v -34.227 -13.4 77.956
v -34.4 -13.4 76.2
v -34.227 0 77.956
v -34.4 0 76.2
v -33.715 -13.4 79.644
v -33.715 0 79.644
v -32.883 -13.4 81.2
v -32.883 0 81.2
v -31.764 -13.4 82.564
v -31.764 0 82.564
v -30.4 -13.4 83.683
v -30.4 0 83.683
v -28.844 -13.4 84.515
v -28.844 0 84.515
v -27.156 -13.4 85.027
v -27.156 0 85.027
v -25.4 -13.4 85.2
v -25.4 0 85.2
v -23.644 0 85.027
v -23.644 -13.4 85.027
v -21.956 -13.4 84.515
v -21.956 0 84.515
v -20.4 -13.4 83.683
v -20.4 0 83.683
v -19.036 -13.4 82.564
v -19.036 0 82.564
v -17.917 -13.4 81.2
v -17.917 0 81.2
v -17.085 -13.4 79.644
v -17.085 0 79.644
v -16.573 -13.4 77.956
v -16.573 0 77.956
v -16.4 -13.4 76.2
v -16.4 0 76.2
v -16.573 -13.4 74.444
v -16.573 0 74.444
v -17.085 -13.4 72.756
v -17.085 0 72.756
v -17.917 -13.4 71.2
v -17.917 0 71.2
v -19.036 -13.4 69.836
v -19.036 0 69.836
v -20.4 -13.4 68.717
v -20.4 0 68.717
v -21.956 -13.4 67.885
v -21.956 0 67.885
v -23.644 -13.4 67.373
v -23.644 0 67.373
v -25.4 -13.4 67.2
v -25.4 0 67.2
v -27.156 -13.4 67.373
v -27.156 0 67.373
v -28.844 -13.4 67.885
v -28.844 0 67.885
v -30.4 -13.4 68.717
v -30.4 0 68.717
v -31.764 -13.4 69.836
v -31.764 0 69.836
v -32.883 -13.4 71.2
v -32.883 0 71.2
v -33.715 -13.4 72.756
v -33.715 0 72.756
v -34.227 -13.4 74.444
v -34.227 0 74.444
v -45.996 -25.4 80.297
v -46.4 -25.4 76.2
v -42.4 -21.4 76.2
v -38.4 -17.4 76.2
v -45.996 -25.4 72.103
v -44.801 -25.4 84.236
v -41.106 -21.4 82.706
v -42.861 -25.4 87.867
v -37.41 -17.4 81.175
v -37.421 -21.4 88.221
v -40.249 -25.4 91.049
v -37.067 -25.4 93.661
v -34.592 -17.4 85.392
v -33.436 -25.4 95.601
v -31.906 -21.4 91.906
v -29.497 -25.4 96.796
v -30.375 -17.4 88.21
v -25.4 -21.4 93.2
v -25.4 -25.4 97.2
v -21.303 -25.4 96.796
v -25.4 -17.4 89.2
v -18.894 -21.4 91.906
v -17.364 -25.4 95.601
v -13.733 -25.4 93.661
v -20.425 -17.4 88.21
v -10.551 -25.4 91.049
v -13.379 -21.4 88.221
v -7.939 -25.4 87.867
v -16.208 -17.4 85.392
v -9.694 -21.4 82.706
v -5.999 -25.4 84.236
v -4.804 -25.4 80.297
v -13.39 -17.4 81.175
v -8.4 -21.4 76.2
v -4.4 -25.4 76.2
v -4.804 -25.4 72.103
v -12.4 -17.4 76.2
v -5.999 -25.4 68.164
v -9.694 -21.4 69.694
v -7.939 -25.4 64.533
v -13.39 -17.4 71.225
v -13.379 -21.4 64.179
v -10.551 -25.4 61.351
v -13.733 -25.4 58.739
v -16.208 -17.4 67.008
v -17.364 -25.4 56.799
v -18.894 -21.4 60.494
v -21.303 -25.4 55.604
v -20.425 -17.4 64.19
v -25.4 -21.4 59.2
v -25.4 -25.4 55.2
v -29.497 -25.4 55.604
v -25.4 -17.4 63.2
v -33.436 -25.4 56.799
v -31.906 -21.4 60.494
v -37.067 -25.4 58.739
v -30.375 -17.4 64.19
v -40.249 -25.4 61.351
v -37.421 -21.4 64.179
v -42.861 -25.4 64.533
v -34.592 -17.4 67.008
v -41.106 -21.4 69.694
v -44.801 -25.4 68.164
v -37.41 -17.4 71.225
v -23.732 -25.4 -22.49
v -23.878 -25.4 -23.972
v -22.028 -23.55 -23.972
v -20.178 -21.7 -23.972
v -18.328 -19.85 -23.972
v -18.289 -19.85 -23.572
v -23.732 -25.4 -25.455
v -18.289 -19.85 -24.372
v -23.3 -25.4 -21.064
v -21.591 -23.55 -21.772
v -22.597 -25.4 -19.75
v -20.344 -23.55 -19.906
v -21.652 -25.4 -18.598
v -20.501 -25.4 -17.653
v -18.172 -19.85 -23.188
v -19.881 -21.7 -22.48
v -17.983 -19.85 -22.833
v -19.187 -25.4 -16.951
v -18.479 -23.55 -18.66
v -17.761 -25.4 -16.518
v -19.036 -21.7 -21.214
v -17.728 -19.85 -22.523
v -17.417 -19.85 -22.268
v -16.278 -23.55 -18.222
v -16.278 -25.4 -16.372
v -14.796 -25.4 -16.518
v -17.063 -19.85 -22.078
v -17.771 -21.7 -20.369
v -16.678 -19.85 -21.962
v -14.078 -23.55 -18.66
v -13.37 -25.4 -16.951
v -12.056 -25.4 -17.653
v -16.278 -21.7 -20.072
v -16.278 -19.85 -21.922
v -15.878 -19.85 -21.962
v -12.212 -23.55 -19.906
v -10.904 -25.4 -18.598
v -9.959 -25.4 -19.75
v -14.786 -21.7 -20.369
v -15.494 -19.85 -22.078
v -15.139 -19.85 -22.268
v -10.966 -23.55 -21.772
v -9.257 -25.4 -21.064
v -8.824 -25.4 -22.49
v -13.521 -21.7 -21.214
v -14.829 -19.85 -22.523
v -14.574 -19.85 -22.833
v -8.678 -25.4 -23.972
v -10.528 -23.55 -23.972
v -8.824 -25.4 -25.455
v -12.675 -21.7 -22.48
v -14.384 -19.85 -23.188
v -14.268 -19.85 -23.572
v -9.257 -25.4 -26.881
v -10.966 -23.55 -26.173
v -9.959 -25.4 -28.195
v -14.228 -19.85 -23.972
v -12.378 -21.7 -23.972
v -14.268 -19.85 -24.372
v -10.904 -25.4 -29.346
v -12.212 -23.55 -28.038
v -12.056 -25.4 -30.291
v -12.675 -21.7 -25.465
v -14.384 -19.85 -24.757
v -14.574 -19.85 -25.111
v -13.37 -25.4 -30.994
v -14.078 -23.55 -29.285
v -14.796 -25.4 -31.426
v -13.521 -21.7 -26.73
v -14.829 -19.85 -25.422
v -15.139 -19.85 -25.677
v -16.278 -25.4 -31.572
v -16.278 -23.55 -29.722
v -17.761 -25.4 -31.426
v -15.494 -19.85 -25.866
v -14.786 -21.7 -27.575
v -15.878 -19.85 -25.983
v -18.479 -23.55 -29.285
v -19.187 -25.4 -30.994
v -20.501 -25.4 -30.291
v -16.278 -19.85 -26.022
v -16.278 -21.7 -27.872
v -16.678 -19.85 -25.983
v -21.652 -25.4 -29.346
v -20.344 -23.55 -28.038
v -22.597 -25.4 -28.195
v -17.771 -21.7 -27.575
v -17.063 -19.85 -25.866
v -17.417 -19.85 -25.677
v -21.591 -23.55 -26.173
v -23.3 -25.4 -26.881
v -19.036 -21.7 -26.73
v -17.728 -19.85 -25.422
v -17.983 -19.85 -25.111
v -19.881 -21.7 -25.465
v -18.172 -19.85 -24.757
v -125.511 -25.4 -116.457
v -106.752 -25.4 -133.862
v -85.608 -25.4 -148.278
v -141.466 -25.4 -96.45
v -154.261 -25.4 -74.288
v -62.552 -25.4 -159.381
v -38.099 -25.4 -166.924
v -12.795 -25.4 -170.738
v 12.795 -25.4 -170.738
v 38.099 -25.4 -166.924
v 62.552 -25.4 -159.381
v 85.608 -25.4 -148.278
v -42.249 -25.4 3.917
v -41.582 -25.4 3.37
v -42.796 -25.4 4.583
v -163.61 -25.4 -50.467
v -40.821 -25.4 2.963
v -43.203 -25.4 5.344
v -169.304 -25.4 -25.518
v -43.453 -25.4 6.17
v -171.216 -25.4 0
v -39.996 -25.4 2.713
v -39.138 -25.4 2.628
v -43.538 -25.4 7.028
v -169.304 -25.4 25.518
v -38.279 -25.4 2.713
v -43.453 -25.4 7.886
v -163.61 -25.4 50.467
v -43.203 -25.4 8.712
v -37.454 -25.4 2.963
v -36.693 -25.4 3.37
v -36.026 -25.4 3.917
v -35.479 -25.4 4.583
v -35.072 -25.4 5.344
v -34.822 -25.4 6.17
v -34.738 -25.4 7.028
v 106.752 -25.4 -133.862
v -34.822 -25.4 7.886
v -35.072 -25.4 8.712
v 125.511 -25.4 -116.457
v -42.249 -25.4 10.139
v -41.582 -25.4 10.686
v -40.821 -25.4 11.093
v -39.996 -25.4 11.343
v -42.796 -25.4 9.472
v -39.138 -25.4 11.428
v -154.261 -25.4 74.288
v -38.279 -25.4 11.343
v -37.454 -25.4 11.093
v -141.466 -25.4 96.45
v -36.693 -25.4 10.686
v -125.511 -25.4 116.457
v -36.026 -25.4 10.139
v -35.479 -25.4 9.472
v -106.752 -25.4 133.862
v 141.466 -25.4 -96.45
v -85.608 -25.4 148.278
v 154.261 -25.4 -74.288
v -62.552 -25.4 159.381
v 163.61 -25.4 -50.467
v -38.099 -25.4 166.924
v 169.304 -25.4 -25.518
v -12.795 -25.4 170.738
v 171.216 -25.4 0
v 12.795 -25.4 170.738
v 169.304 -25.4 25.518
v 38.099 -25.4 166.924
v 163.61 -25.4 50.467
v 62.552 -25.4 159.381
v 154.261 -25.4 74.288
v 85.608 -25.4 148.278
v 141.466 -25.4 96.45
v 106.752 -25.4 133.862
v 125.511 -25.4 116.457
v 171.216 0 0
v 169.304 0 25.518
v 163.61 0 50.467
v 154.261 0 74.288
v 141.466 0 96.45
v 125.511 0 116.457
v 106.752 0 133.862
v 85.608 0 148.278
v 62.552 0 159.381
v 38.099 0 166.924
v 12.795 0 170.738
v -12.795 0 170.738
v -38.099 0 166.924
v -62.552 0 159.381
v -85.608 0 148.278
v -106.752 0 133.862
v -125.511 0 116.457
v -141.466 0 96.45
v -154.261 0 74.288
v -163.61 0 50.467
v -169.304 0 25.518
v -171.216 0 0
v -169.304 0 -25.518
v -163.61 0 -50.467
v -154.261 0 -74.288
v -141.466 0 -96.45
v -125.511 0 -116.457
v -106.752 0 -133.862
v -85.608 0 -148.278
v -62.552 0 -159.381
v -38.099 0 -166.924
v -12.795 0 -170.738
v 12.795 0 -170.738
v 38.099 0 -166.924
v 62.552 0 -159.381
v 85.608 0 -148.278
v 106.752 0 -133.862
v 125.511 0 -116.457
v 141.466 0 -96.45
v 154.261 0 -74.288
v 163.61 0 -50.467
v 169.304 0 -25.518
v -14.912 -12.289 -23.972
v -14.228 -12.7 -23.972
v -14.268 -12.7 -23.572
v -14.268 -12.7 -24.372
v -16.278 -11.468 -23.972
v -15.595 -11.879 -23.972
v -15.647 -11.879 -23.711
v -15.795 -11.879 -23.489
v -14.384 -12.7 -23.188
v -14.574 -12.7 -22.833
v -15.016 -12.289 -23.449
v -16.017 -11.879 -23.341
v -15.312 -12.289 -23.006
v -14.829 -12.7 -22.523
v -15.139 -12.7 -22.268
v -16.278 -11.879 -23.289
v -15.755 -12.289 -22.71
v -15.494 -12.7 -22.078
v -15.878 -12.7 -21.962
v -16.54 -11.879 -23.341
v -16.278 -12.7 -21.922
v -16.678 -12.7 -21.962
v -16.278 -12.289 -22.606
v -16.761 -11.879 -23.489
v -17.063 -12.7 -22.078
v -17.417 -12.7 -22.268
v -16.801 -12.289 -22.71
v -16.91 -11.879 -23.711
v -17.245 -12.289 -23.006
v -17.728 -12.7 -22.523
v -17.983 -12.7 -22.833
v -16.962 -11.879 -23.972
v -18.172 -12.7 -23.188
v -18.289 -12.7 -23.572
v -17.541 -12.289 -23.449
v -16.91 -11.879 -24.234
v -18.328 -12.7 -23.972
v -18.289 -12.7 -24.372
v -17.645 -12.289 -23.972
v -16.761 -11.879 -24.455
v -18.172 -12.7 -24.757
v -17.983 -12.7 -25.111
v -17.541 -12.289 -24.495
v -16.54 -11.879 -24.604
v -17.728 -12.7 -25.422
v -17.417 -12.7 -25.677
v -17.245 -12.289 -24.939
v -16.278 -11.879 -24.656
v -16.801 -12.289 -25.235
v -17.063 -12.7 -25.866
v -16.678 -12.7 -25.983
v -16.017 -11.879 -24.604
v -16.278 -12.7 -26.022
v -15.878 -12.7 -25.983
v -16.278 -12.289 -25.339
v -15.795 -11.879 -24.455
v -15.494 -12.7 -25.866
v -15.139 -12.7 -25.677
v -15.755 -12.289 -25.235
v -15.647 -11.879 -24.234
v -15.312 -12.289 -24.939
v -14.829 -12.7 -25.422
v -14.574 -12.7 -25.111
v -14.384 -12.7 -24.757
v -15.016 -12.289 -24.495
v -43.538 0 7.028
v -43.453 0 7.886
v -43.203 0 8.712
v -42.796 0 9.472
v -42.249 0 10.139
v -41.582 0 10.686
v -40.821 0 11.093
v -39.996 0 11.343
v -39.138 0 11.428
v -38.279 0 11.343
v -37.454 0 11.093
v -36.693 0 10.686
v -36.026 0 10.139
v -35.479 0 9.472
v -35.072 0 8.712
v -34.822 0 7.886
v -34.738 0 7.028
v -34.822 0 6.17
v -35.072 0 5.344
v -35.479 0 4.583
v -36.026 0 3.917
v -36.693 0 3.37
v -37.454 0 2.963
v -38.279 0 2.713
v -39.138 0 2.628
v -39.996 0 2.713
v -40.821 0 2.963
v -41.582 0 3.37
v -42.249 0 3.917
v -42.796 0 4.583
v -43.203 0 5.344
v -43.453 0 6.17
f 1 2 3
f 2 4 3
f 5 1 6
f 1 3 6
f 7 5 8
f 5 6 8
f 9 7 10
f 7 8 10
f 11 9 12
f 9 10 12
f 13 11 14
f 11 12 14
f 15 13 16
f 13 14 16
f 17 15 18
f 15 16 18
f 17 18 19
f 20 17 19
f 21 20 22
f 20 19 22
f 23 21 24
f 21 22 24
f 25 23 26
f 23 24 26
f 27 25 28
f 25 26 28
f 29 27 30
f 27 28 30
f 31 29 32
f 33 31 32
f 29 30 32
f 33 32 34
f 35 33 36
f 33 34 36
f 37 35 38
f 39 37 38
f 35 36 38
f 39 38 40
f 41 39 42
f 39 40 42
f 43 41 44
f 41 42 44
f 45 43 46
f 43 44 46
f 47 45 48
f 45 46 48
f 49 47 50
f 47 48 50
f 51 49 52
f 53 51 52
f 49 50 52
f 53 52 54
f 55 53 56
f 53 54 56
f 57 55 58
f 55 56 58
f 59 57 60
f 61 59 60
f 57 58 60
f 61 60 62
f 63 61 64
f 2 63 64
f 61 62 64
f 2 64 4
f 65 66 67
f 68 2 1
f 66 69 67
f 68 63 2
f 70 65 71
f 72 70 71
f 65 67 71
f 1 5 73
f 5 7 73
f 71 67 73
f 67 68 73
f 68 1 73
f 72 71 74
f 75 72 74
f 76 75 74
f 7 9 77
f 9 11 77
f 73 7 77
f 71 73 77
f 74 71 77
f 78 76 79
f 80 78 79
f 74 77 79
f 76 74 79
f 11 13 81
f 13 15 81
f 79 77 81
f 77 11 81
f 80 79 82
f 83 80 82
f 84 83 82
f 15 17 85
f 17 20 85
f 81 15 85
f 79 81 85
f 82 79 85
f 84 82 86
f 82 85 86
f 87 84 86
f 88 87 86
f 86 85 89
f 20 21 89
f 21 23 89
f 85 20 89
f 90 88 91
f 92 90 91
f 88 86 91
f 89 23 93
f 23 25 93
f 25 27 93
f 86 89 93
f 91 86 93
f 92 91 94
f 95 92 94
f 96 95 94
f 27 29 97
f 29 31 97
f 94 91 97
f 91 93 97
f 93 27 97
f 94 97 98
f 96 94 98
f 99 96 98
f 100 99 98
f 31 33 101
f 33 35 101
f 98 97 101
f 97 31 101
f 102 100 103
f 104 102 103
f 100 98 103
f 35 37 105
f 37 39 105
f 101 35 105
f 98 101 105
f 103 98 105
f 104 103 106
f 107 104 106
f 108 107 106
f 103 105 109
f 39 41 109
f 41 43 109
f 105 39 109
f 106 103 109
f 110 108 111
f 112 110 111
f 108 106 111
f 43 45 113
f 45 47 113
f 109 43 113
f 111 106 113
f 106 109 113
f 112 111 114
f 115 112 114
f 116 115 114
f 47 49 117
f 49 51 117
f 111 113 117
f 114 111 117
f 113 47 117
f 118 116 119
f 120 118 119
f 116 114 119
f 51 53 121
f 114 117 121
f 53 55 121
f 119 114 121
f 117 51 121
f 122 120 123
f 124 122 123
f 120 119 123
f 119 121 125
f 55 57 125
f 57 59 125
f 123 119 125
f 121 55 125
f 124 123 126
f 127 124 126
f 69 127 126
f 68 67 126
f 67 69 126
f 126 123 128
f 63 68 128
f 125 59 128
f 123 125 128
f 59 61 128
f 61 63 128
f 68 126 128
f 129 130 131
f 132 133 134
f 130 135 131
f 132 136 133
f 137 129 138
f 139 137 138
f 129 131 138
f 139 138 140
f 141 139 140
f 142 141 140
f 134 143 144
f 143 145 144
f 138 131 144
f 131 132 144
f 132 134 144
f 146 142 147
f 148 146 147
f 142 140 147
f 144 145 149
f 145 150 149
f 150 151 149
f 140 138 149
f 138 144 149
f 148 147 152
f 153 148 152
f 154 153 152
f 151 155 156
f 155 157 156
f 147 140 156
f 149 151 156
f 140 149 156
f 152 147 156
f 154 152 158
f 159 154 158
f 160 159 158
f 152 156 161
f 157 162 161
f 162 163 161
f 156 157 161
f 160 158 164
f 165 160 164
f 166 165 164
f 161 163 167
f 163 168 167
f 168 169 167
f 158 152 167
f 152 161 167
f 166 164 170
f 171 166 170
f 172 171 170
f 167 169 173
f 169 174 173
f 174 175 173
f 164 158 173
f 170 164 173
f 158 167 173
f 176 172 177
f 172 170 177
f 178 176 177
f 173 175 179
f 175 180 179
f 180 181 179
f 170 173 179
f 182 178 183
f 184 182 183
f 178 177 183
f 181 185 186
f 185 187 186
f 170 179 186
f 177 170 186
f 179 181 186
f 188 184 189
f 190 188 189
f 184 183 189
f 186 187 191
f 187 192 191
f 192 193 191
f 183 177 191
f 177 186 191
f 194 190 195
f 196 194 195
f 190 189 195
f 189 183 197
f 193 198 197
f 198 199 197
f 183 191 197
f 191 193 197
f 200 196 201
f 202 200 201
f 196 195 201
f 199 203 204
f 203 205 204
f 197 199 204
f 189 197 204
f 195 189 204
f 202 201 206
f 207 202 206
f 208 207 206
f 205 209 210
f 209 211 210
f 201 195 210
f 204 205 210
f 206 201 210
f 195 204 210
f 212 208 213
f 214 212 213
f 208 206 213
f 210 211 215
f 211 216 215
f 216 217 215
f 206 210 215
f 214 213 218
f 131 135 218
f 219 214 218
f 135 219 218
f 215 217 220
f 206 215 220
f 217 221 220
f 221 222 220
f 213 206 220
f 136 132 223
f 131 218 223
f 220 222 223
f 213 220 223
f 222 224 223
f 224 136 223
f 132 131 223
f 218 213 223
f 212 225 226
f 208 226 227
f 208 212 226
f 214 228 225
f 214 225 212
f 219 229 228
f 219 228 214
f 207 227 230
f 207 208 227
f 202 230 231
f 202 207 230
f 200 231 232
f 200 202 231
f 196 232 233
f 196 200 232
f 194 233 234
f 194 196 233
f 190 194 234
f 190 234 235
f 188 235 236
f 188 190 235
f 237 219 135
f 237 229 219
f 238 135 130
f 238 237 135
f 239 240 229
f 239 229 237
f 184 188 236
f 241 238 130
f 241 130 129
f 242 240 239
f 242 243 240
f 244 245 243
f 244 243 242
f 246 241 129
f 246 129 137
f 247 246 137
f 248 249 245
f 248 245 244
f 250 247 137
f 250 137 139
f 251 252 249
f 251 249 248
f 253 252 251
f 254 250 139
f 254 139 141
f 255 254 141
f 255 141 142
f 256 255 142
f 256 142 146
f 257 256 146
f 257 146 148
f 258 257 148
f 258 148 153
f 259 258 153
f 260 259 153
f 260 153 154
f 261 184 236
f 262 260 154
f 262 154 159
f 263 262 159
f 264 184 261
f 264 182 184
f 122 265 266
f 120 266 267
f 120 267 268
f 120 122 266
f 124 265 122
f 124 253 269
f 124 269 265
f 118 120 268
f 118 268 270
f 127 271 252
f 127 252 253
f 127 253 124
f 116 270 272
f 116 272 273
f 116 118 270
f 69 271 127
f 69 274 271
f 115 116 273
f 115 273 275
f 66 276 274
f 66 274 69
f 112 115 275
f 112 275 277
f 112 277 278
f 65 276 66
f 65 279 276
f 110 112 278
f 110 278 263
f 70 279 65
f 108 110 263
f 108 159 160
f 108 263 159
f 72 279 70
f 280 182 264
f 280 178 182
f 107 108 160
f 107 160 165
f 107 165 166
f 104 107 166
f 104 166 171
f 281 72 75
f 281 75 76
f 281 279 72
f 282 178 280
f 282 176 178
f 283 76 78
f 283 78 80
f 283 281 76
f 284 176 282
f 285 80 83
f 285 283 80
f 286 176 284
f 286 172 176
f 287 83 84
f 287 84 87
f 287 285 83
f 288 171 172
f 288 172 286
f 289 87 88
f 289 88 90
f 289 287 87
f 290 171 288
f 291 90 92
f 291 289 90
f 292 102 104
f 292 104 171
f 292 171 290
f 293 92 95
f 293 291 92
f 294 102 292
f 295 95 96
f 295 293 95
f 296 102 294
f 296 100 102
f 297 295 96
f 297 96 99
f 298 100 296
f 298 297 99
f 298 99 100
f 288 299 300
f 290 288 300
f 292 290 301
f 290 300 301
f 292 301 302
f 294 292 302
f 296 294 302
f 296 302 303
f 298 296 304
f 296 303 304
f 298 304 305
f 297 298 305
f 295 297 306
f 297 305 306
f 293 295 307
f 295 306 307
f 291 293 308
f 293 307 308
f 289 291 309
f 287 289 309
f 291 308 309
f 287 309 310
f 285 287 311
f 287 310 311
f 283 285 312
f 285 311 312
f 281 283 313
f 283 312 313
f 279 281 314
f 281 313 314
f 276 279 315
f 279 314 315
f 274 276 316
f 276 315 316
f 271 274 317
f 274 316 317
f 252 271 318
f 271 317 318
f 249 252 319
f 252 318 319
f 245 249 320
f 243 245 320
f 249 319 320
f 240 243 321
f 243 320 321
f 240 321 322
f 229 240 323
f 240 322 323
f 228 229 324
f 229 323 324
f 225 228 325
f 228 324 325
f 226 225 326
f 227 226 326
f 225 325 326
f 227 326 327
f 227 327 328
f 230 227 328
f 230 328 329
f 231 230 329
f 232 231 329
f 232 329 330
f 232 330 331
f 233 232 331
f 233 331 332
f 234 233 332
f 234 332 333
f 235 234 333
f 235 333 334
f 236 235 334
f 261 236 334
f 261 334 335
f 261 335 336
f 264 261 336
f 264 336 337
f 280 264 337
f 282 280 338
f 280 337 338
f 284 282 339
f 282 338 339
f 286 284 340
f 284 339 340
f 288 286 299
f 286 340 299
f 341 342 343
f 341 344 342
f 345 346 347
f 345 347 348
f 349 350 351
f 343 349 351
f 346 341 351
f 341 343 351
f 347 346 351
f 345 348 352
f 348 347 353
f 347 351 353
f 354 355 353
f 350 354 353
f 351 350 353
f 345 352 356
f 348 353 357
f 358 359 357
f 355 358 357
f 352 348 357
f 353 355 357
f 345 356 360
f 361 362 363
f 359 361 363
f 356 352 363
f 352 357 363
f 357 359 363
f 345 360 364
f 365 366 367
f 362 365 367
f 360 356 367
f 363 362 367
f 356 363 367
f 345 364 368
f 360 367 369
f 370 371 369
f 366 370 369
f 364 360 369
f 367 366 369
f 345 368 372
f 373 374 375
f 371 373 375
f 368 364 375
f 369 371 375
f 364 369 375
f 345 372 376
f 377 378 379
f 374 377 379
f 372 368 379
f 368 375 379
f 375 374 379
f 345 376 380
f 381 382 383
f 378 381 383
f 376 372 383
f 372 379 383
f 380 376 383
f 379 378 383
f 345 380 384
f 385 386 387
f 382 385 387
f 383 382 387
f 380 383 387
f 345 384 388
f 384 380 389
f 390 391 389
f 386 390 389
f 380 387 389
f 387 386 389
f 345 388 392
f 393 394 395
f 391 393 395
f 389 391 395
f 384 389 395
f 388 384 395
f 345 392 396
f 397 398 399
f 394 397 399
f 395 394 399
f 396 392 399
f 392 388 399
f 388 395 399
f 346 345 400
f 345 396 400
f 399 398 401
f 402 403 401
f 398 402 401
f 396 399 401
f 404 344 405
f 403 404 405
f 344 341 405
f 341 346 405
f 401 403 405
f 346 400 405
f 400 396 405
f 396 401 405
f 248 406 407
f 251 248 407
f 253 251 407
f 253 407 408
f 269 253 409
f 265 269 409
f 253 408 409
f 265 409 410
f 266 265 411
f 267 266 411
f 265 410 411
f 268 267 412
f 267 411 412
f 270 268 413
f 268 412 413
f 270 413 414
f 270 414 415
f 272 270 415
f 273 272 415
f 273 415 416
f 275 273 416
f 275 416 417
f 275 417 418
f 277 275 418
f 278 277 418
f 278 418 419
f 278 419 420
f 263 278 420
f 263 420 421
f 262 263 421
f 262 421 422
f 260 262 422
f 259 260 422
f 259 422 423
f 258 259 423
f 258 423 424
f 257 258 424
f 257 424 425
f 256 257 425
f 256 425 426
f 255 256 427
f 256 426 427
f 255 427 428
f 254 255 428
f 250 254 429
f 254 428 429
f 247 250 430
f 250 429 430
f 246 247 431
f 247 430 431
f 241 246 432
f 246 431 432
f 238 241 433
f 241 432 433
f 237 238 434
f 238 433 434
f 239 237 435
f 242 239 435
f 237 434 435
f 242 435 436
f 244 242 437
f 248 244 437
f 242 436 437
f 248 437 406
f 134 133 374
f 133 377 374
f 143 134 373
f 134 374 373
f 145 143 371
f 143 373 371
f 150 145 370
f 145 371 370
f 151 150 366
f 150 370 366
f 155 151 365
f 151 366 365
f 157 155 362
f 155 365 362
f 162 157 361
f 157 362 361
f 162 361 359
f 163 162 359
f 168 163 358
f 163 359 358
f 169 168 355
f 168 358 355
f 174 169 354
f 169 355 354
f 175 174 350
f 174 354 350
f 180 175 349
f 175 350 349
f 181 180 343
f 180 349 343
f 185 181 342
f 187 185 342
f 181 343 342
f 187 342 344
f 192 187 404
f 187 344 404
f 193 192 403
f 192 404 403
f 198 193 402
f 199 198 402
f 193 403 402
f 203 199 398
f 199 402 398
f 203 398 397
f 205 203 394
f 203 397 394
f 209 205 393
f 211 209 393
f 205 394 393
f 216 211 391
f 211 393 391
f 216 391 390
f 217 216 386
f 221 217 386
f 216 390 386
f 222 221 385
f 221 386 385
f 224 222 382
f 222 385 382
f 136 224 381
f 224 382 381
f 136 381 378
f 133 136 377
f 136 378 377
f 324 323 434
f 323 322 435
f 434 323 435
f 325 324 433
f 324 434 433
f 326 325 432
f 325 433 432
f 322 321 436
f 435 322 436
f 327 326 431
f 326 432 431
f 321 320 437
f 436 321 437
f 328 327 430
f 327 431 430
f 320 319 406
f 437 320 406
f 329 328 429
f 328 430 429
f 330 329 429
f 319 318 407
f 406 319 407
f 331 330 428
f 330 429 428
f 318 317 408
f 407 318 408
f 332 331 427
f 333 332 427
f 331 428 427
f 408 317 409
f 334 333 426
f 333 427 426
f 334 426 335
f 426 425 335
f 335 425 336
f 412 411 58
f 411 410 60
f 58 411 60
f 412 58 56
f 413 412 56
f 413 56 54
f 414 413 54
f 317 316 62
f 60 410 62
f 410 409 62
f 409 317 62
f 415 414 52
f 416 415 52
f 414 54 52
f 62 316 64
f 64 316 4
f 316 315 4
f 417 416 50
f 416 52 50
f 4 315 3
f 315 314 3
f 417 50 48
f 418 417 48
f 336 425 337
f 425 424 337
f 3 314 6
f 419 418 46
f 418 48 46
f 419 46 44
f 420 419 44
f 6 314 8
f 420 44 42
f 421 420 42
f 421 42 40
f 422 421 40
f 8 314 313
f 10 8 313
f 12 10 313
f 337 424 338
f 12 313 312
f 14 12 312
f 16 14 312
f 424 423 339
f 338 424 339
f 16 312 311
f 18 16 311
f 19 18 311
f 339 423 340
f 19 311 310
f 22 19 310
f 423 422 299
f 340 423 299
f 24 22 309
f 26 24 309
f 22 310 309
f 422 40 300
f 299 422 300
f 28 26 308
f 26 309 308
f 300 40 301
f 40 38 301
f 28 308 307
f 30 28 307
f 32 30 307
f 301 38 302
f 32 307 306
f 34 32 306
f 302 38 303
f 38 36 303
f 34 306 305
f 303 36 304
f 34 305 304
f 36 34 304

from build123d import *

# Parameters (mm, degrees)
F0_R           = 171.216465226
F1_DEPTH       = 25.4
F3_D           = 8.8
F4_D           = 18
F4_CSINK_D     = 42
F4_CSINK_ANGLE = 90
F5_D           = 4.1
F5_DEPTH       = 12.7
F5_CSINK_D     = 15.2
F5_CSINK_ANGLE = 90
F5_TIP         = 1.231764269


with BuildPart() as f1:
    # F0 (on Front) → F1 (new body)
    with BuildSketch(Plane.XZ):
        Circle(F0_R)
    extrude(amount=F1_DEPTH)

    # F3 (through all)
    with Locations(Plane.XZ.offset(25.4)):
        with Locations((-39.1375060386, 7.0279744302)):
            Hole(F3_D / 2)

    # F4 (through all)
    with Locations(Plane.XZ.offset(25.4)):
        with Locations((-25.4, 76.2)):
            CounterSinkHole(F4_D / 2, F4_CSINK_D / 2, counter_sink_angle=F4_CSINK_ANGLE)

    # F5
    with Locations(Plane.XZ.offset(25.4)):
        with Locations((-16.2783094505, -23.9721943216)):
            CounterSinkHole(F5_D / 2, F5_CSINK_D / 2, depth=F5_DEPTH, counter_sink_angle=F5_CSINK_ANGLE)
            with Locations((0, 0, -(F5_DEPTH + F5_TIP / 2))):  # 118° drill point
                Cone(0, F5_D / 2, F5_TIP, mode=Mode.SUBTRACT)


solid = f1.part
